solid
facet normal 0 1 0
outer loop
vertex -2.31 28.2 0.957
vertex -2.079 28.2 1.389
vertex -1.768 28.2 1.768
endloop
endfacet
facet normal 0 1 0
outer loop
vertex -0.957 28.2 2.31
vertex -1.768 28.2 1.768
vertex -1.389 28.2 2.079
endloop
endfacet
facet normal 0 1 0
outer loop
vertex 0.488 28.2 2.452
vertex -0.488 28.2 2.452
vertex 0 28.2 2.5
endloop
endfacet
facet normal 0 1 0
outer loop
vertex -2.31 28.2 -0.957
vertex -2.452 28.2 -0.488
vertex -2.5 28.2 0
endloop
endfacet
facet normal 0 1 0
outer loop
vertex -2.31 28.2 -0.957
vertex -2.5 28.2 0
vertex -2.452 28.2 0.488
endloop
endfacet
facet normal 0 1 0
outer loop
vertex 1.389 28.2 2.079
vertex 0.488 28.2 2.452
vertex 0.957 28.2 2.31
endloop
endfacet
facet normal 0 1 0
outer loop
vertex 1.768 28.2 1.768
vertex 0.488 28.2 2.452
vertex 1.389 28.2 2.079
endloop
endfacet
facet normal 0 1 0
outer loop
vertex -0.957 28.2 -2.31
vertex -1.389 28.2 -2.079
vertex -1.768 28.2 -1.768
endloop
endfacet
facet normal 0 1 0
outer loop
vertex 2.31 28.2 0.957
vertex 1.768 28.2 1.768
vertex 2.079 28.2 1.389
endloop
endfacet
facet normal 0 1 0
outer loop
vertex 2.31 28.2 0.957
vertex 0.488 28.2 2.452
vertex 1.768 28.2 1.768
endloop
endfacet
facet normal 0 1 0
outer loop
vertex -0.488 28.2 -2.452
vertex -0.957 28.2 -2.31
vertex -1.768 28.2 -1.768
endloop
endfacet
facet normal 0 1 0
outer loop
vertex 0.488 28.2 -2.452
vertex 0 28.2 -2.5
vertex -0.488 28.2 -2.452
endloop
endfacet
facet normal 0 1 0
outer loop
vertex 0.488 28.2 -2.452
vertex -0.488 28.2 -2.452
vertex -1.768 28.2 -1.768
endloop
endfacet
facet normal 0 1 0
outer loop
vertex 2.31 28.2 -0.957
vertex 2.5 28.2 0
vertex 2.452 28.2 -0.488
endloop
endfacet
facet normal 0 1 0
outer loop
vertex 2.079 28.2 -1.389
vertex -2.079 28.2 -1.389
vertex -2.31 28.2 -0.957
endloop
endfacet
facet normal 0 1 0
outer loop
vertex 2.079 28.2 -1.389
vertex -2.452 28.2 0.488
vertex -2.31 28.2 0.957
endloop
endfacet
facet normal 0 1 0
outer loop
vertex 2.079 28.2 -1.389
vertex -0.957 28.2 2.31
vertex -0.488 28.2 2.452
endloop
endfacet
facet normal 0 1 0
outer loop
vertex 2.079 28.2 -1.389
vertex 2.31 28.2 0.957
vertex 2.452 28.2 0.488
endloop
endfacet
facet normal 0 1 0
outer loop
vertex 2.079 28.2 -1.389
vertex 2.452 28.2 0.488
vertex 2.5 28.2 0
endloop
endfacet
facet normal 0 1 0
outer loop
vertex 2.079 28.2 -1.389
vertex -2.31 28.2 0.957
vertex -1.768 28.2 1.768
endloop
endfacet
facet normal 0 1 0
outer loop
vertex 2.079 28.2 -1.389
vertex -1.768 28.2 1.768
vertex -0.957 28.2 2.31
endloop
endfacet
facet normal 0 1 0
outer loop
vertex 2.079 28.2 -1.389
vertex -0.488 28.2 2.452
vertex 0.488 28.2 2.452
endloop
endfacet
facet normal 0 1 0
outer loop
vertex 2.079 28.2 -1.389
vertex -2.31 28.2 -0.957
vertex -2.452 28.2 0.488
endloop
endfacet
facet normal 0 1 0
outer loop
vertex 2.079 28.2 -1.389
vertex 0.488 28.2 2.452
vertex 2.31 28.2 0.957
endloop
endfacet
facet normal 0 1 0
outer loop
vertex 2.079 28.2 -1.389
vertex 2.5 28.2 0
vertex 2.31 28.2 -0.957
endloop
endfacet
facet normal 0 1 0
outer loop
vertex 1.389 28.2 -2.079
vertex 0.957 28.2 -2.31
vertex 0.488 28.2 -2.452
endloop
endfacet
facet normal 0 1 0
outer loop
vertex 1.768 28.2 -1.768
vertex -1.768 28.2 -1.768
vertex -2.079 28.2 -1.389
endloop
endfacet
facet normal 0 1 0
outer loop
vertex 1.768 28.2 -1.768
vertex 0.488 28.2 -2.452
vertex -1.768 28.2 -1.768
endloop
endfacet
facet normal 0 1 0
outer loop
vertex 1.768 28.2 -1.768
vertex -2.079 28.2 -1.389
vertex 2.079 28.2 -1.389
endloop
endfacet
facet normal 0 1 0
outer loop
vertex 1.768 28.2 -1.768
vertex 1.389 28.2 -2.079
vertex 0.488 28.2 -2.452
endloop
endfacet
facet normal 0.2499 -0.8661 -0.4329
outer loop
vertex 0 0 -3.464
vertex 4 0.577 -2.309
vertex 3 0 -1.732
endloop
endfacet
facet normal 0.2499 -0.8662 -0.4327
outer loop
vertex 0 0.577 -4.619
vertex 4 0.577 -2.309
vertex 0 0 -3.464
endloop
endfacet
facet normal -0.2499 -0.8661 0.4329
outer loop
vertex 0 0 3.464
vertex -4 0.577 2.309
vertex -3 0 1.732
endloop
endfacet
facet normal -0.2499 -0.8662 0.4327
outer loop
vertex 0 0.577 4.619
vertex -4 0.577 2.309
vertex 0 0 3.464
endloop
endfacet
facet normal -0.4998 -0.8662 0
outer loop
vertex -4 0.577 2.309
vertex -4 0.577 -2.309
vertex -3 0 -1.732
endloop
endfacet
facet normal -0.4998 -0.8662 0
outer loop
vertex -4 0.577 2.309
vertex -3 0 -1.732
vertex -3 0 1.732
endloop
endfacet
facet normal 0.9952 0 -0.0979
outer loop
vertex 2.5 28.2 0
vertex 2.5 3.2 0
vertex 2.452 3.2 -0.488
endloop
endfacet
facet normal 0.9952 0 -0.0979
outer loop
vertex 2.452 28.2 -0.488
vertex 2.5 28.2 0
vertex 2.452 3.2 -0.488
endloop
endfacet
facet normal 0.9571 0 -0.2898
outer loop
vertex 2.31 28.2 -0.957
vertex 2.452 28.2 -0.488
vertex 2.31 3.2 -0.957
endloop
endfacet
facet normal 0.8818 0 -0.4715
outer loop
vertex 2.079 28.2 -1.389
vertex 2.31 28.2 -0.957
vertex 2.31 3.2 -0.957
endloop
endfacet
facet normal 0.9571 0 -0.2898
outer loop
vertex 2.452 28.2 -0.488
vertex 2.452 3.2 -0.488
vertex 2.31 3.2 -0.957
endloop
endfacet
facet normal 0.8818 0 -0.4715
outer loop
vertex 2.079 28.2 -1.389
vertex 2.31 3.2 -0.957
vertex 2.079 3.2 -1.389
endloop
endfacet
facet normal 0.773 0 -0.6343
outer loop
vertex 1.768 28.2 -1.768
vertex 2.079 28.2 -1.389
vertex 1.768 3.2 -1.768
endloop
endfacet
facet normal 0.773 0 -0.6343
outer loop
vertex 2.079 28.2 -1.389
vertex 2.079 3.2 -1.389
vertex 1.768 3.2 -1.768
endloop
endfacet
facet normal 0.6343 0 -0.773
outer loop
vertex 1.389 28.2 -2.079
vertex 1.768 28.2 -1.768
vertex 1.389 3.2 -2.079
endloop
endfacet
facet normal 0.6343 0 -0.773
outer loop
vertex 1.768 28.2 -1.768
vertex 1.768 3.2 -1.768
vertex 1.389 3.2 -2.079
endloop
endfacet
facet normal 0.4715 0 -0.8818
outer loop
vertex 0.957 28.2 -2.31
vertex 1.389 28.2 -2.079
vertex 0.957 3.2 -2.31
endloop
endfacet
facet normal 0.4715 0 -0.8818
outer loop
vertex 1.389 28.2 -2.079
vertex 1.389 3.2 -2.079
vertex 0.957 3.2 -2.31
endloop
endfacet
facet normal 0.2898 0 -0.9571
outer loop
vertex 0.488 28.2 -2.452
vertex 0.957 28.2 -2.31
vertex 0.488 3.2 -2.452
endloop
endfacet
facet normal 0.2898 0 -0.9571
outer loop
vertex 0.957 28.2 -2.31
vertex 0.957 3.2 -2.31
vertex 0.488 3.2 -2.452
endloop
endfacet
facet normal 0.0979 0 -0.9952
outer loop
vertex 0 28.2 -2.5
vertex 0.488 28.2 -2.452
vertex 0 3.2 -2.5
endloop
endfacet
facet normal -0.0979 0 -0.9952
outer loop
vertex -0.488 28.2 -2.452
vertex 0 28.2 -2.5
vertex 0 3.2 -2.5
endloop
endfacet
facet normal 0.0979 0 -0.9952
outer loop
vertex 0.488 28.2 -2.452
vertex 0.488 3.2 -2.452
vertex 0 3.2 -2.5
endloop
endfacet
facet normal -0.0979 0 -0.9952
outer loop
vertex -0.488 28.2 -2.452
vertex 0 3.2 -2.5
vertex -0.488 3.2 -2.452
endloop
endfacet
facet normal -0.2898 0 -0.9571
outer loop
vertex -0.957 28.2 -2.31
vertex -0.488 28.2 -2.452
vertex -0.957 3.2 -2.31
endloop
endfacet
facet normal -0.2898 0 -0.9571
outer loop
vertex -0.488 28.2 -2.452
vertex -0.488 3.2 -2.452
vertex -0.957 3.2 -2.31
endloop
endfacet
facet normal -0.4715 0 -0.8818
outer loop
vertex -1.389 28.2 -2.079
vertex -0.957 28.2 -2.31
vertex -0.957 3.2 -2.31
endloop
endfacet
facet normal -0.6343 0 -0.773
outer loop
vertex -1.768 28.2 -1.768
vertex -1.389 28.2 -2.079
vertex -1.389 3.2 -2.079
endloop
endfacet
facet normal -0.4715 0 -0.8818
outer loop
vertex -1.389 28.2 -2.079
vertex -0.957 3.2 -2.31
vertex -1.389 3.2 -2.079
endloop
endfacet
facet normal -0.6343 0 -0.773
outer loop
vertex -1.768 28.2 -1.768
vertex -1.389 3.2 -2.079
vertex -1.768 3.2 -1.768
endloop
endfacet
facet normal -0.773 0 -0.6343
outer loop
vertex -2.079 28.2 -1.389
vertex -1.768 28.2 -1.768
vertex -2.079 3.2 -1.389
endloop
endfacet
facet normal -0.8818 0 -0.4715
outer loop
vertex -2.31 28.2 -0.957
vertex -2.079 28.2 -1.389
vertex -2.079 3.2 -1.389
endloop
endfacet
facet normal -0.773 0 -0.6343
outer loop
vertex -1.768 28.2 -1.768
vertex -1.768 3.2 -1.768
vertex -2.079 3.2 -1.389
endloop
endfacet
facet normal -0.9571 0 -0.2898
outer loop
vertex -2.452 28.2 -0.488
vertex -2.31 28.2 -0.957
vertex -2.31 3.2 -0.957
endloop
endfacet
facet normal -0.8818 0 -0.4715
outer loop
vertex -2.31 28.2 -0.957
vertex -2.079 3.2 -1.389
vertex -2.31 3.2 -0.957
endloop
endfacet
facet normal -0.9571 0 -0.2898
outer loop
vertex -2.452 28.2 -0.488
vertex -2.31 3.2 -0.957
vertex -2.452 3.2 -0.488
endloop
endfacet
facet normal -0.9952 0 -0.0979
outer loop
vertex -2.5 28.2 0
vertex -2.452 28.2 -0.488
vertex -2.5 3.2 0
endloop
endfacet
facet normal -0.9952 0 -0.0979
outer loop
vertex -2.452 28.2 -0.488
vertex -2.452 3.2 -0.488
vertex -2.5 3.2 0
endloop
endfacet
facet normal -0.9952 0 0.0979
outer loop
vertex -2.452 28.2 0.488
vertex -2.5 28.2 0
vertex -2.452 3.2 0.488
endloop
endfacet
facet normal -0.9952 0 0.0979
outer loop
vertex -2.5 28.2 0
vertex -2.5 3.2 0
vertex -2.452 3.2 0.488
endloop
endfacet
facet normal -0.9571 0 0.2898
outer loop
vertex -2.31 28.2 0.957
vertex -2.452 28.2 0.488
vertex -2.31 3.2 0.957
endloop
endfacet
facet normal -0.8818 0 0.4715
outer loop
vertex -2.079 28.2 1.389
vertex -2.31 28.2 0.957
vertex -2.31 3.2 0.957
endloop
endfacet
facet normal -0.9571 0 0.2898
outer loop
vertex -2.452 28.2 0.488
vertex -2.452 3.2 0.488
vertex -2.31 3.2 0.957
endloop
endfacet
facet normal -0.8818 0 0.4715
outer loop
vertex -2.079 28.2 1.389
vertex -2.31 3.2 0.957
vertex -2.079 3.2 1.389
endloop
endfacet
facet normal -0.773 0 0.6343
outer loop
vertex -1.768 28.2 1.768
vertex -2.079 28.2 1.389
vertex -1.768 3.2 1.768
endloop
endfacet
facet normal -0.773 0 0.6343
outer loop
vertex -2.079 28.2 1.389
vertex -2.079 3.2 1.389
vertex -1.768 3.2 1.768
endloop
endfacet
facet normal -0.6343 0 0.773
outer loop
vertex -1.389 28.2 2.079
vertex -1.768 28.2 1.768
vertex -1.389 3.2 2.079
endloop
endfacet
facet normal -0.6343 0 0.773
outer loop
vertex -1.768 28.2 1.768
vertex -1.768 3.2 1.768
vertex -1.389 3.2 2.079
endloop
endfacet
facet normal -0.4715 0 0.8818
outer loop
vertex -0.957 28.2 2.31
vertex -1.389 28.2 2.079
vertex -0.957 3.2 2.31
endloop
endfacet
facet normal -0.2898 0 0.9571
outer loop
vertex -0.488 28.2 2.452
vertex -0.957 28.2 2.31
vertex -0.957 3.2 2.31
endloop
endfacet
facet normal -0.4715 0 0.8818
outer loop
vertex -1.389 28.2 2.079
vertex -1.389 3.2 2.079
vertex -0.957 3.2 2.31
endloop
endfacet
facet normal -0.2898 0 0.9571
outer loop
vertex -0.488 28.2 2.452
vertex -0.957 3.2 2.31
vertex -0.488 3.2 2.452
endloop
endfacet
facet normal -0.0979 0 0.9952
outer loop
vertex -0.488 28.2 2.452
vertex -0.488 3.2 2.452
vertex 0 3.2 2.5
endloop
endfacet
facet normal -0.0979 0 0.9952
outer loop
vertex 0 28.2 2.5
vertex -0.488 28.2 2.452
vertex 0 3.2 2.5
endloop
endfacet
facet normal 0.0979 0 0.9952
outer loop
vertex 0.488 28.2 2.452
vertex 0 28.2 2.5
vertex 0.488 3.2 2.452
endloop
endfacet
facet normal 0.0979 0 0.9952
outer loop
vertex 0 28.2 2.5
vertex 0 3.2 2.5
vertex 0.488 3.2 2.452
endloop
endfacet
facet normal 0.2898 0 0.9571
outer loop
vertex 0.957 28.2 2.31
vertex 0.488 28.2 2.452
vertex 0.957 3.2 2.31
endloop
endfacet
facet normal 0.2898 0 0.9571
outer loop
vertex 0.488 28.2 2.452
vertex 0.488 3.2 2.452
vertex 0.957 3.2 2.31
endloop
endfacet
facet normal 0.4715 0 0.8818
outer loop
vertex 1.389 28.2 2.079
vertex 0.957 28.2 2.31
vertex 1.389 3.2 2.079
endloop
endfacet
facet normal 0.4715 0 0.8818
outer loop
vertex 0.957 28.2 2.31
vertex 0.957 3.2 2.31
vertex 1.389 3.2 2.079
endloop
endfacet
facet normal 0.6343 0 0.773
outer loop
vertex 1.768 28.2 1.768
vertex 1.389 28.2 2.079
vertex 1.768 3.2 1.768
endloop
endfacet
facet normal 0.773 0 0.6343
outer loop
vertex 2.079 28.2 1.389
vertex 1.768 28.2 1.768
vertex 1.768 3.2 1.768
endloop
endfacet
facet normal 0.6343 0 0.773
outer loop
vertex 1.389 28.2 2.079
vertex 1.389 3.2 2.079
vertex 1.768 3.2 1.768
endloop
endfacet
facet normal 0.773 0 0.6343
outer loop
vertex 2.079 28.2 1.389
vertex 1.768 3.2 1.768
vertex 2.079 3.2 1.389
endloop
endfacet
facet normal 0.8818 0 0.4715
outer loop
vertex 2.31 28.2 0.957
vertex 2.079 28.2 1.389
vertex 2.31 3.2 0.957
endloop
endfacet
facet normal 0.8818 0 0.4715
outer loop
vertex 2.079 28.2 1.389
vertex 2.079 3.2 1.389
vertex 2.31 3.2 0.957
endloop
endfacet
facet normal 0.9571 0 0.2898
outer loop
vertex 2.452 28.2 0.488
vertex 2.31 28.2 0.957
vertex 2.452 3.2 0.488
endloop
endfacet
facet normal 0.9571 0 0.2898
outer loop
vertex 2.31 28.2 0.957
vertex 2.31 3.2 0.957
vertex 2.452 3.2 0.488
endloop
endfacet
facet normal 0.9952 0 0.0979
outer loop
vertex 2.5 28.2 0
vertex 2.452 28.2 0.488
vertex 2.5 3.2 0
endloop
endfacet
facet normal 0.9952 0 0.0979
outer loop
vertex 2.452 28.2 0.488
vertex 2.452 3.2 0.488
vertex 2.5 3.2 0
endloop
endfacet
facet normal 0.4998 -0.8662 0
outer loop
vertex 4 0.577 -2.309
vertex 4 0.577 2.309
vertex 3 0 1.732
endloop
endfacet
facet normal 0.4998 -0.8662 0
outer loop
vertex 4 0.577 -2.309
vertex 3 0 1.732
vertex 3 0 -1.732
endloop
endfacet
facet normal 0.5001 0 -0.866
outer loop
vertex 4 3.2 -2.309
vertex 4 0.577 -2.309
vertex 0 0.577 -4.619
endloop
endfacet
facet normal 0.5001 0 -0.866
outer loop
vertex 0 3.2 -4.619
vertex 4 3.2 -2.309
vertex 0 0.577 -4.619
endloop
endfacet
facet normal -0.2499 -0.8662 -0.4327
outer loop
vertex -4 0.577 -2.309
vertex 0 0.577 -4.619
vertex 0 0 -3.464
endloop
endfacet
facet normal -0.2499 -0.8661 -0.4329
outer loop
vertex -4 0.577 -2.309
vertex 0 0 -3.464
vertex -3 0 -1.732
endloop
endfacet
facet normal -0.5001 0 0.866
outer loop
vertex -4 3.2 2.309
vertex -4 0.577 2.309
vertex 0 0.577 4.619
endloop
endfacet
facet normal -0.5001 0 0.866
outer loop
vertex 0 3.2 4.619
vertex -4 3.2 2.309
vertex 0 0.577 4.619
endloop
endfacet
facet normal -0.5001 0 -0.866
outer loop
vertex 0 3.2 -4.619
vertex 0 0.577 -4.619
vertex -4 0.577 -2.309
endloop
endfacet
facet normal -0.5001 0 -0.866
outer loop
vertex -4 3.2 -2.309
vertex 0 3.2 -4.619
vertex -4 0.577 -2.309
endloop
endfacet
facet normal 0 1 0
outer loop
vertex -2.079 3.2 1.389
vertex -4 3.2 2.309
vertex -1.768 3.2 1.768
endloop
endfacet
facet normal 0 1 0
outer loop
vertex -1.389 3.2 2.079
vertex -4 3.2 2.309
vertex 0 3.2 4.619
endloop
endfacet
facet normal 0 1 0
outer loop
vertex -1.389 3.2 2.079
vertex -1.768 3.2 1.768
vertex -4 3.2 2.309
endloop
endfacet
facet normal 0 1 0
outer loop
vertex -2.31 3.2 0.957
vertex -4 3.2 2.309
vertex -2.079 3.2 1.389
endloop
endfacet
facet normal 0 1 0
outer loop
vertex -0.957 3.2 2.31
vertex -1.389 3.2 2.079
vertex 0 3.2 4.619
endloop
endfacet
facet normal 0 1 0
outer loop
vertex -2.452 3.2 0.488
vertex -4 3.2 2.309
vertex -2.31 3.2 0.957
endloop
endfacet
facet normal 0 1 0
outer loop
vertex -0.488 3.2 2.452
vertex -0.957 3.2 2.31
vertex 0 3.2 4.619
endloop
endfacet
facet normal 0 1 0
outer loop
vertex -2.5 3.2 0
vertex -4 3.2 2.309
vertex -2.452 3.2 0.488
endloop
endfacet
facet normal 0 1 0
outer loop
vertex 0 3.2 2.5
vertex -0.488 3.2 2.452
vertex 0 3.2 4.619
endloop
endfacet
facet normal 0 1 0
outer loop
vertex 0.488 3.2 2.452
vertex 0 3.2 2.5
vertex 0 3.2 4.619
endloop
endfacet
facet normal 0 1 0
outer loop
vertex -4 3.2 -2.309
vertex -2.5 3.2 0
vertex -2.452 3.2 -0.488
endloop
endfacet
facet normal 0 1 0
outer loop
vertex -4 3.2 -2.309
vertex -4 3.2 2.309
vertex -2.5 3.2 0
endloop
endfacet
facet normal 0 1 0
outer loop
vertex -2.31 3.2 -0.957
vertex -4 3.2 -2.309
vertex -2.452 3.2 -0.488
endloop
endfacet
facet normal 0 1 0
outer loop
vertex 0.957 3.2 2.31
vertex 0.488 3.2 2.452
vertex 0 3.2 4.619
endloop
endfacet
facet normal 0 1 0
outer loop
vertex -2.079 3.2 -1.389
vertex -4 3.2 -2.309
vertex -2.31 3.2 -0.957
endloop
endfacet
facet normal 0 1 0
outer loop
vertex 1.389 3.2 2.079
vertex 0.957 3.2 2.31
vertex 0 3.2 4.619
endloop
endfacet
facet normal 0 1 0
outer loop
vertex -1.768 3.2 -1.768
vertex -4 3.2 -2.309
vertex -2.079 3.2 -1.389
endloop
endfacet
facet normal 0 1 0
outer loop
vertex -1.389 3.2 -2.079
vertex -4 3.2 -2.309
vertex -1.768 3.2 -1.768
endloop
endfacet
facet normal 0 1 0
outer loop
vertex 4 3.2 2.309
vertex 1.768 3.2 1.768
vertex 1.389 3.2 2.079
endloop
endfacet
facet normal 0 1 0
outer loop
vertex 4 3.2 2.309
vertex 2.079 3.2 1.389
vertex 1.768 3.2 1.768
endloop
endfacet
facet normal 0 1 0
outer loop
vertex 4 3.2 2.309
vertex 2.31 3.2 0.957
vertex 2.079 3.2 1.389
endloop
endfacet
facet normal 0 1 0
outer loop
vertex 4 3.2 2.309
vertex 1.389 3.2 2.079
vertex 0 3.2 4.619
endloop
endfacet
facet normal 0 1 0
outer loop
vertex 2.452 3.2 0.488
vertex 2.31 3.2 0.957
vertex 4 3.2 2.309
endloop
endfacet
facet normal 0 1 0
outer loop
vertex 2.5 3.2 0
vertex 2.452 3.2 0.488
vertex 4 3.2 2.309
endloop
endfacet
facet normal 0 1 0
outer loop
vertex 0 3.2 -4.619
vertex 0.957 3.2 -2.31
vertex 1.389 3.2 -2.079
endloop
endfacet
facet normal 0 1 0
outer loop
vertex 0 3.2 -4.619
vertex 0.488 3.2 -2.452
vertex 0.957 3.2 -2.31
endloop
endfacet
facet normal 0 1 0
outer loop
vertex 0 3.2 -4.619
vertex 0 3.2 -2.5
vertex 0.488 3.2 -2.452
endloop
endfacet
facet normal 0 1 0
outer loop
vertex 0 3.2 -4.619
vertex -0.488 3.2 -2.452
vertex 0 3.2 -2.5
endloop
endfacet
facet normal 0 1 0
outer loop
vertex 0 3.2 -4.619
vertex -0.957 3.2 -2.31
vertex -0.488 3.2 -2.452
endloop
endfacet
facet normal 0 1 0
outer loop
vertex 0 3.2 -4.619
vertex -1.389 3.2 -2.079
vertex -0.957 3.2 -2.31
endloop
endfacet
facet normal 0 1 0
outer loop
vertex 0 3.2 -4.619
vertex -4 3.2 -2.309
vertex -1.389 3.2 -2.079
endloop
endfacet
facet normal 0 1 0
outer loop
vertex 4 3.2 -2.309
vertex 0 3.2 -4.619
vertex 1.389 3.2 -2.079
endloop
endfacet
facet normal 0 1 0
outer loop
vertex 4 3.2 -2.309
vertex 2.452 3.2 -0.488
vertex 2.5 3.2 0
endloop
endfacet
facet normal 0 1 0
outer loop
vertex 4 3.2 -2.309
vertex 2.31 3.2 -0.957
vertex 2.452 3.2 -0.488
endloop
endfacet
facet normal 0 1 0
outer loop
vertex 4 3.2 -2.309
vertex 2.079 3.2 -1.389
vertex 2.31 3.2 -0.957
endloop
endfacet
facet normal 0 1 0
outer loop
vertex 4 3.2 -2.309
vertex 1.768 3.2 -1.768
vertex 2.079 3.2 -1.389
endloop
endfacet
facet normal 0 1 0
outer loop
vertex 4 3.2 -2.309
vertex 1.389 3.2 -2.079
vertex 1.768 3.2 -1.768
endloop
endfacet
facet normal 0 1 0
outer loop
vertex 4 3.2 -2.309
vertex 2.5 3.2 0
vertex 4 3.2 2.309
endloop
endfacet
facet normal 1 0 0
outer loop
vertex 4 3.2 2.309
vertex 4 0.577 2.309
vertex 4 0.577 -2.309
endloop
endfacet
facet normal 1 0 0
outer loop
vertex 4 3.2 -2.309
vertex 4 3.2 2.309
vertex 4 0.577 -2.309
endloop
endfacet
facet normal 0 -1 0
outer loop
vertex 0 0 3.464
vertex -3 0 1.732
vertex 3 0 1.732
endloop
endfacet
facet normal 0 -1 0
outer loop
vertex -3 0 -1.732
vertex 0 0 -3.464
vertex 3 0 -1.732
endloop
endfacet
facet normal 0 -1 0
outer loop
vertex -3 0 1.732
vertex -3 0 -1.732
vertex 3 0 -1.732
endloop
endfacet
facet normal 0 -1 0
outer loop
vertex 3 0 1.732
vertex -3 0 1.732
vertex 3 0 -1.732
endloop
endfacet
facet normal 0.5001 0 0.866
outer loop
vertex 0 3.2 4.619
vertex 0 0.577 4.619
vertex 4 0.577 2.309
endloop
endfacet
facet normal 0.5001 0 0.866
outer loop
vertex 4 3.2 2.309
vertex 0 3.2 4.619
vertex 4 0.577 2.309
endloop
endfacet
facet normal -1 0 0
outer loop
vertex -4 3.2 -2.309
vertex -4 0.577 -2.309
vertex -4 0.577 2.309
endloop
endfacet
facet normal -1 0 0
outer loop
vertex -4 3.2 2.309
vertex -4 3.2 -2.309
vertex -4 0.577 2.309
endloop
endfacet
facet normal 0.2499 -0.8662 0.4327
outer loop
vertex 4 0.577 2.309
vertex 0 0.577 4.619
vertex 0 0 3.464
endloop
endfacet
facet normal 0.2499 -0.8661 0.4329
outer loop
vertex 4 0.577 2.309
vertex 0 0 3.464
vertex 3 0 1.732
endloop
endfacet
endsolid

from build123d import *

# Parameters (mm, degrees)
EXTRUDE_1_DEPTH = 3.2
SKETCH_2_R      = 2.5
EXTRUDE_2_DEPTH = 25
CHAMFER_1_SIZE  = 1
CHAMFER_1_SIZE2 = 0.577350269


with BuildPart() as part:
    # Эскиз1 → Бобышка-Вытянуть1 (new body)
    with BuildSketch(Plane(origin=(0, 0, 0), x_dir=(1, 0, 0), z_dir=(0, 1, 0))):
        Polygon((4, -2.309401077), (4, 2.309401077), (0, 4.618802154), (-4, 2.309401077), (-4, -2.309401077), (0, -4.618802154), align=None)
    extrude(amount=EXTRUDE_1_DEPTH)

    # Эскиз2 → Бобышка-Вытянуть2 (add)
    with BuildSketch(Plane(origin=(0, 3.2, 0), x_dir=(1, 0, 0), z_dir=(0, 1, 0))):
        Circle(SKETCH_2_R)
    extrude(amount=EXTRUDE_2_DEPTH)

    # Фаска1
    chamfer_1_edges = [part.edges().sort_by_distance(p)[0] for p in [
        (-2, 0, 3.464101615),
        (-4, 0, 0),
        (-2, 0, -3.464101615),
        (2, 0, -3.464101615),
        (4, 0, 0),
        (2, 0, 3.464101615),
    ]]
    chamfer_1_side = [part.faces().sort_by_distance(p)[0] for p in [
        (0, 0, 0),
    ]]
    chamfer(chamfer_1_edges, length=CHAMFER_1_SIZE, length2=CHAMFER_1_SIZE2, reference=chamfer_1_side[0])


solid = part.part
